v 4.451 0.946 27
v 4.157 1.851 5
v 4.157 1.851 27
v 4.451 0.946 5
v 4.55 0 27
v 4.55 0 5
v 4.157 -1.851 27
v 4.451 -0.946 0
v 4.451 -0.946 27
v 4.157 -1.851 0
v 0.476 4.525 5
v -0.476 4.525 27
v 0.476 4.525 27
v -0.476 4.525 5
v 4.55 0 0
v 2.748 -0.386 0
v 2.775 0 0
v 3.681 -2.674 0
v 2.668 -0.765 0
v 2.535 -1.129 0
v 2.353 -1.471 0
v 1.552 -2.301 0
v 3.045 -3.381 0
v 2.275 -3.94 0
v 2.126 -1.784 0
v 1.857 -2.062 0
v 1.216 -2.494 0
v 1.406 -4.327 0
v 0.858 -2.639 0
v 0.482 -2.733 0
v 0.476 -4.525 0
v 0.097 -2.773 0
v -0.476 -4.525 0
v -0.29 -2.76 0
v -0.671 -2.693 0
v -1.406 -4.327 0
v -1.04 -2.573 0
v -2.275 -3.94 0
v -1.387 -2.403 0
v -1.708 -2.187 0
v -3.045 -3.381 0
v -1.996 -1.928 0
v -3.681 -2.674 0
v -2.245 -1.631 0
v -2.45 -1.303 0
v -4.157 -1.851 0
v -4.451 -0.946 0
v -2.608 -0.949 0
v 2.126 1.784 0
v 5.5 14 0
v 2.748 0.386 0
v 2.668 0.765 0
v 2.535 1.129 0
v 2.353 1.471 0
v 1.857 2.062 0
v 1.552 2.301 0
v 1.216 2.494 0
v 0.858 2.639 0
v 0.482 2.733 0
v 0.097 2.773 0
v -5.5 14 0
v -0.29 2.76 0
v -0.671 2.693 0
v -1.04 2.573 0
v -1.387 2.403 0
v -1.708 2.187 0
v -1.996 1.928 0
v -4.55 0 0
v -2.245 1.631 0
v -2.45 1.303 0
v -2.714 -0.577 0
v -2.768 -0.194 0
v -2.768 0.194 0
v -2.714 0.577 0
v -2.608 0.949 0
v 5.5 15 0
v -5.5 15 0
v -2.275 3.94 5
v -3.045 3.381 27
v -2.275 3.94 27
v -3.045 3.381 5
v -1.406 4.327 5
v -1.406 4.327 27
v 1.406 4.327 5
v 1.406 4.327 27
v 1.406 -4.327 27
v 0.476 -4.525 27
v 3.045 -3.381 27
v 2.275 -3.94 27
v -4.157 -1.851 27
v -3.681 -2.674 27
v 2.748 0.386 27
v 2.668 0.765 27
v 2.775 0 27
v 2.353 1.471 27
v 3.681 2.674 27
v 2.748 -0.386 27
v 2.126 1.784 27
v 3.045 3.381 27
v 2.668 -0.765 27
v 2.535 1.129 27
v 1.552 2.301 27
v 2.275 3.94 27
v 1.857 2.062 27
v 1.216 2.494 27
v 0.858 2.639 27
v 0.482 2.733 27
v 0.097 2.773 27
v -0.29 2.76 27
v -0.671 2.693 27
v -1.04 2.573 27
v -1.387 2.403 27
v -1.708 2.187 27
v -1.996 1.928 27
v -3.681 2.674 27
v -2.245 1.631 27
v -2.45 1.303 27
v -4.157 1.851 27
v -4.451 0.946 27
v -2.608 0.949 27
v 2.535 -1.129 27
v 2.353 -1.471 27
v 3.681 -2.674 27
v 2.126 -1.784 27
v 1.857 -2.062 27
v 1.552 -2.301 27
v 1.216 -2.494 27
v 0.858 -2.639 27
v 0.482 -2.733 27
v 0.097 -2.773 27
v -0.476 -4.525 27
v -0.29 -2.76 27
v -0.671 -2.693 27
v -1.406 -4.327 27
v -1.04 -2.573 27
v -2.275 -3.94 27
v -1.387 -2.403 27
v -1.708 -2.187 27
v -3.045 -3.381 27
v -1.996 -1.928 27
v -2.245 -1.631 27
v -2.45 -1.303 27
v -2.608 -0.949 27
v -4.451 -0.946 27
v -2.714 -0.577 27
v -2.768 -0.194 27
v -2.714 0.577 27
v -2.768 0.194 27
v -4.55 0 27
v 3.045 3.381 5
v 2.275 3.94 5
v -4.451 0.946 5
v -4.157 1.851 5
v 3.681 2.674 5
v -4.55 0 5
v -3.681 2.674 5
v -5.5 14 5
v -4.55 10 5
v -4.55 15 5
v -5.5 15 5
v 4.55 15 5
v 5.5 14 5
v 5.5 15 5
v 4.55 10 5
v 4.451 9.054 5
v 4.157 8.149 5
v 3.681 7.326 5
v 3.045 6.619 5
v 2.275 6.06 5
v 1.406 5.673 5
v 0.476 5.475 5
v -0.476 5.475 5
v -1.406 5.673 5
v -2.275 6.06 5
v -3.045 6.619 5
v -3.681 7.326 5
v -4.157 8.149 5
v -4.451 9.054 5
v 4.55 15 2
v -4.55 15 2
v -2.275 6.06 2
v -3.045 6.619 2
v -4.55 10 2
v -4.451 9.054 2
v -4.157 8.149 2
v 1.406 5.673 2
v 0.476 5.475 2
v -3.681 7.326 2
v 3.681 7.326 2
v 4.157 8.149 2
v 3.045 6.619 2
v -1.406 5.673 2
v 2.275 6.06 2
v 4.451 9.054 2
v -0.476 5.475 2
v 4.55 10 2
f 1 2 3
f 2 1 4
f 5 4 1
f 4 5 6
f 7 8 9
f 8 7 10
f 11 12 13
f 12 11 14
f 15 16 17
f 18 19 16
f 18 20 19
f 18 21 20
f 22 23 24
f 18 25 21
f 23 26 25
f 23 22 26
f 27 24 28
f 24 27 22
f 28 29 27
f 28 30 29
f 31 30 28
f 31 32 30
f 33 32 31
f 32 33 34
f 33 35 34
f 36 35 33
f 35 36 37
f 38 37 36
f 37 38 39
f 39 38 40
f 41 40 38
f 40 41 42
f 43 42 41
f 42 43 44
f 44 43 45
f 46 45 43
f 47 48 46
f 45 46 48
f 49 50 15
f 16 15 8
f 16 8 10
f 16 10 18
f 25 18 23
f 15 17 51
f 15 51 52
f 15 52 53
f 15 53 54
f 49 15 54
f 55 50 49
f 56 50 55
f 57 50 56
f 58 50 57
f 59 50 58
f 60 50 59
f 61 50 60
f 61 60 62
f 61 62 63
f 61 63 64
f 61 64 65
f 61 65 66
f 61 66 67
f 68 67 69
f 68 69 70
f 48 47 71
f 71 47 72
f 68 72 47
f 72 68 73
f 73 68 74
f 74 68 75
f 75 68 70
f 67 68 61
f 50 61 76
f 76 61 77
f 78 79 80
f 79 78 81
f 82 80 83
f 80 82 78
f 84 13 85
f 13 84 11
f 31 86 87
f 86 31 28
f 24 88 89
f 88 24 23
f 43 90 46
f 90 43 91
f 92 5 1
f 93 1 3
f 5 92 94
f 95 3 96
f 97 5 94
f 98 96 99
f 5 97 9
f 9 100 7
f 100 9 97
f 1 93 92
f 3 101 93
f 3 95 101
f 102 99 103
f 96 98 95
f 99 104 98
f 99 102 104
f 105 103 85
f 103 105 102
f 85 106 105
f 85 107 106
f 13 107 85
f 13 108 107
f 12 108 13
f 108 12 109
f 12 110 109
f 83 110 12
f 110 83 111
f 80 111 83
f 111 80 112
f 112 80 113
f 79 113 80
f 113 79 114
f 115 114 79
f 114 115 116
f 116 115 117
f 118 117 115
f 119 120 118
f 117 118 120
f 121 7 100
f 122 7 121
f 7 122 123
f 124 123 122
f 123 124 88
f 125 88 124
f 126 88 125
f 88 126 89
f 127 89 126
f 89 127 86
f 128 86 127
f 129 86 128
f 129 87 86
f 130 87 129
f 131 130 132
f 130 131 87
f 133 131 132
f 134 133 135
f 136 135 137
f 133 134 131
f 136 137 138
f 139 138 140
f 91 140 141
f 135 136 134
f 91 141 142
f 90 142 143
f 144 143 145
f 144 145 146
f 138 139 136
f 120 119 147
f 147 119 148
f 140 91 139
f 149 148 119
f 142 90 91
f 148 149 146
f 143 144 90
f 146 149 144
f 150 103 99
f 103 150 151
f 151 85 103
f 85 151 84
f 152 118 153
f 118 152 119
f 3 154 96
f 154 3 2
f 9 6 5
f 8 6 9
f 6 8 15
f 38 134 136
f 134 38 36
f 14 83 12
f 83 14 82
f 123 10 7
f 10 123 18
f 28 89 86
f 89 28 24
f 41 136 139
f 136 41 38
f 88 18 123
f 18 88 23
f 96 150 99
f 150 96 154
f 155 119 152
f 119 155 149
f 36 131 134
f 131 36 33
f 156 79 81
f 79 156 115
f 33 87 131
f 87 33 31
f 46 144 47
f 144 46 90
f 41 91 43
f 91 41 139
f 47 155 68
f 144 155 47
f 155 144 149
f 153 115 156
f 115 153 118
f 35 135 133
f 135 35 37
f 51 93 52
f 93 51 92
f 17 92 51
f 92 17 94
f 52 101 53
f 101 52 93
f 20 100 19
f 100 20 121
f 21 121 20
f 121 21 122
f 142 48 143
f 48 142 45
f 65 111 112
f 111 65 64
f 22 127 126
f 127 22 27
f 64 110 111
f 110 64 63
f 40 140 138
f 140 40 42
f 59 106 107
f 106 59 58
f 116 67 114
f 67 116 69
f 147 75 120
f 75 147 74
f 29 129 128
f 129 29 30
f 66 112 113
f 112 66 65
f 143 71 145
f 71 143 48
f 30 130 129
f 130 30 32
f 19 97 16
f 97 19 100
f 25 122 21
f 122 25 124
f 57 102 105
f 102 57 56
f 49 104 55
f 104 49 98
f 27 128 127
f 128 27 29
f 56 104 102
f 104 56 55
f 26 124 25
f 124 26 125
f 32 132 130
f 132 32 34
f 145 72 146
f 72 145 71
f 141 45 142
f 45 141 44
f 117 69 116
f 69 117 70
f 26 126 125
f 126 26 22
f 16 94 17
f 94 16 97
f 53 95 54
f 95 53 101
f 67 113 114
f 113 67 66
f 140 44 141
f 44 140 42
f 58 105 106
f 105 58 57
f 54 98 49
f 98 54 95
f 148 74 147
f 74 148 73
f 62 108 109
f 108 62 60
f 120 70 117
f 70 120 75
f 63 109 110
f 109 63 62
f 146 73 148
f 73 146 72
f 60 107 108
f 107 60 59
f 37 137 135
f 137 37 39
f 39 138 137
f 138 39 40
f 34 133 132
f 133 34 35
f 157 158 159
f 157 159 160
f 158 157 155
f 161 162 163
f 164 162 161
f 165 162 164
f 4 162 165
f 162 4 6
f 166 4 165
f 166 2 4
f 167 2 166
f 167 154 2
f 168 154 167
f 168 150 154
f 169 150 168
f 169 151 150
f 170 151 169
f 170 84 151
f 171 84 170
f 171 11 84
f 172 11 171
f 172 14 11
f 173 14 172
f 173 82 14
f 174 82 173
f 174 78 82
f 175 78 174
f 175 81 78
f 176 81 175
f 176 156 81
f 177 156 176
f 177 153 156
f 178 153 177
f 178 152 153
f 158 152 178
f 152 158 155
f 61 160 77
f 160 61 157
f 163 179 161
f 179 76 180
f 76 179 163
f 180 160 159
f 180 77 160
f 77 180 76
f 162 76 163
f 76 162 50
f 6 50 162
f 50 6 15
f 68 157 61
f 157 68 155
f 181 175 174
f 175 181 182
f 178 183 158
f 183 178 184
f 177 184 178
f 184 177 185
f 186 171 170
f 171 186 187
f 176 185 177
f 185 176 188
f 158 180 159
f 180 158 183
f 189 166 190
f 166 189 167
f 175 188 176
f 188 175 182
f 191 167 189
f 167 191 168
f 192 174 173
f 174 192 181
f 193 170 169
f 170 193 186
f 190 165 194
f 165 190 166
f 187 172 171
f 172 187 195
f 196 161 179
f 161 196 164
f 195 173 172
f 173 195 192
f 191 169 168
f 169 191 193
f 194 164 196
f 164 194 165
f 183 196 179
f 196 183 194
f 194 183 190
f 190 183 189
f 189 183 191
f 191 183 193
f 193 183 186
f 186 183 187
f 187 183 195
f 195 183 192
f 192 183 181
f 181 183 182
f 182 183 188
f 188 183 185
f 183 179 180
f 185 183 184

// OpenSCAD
holderHeight = 27;

module base() {
    hull() {
        translate([-4.55, 0, 0]) cube([9.1, 1, 5]);
        translate([-5.5, 14, 0]) cube([11, 1, 5]);
    }
}

module antennaHolder() {
    difference() {
        base();
        hull() {
            translate([0, 10, 2]) cylinder(h=3, d=9.1, $fn=30);
            translate([-4.55, 14, 2]) cube([9.1, 1, 3]);
        }
    }
}

module cylinderPart() {
    difference() {
        cylinder(h = holderHeight, d = 9.1, $fn=30);
        cylinder(h = holderHeight, d = 5.55, $fn=45); // hole
    }
}

module main() {
    cylinderPart();
    difference() {
        antennaHolder();
        cylinder(h = holderHeight, d = 5.55, $fn=45); // hole
    }

}

main();
